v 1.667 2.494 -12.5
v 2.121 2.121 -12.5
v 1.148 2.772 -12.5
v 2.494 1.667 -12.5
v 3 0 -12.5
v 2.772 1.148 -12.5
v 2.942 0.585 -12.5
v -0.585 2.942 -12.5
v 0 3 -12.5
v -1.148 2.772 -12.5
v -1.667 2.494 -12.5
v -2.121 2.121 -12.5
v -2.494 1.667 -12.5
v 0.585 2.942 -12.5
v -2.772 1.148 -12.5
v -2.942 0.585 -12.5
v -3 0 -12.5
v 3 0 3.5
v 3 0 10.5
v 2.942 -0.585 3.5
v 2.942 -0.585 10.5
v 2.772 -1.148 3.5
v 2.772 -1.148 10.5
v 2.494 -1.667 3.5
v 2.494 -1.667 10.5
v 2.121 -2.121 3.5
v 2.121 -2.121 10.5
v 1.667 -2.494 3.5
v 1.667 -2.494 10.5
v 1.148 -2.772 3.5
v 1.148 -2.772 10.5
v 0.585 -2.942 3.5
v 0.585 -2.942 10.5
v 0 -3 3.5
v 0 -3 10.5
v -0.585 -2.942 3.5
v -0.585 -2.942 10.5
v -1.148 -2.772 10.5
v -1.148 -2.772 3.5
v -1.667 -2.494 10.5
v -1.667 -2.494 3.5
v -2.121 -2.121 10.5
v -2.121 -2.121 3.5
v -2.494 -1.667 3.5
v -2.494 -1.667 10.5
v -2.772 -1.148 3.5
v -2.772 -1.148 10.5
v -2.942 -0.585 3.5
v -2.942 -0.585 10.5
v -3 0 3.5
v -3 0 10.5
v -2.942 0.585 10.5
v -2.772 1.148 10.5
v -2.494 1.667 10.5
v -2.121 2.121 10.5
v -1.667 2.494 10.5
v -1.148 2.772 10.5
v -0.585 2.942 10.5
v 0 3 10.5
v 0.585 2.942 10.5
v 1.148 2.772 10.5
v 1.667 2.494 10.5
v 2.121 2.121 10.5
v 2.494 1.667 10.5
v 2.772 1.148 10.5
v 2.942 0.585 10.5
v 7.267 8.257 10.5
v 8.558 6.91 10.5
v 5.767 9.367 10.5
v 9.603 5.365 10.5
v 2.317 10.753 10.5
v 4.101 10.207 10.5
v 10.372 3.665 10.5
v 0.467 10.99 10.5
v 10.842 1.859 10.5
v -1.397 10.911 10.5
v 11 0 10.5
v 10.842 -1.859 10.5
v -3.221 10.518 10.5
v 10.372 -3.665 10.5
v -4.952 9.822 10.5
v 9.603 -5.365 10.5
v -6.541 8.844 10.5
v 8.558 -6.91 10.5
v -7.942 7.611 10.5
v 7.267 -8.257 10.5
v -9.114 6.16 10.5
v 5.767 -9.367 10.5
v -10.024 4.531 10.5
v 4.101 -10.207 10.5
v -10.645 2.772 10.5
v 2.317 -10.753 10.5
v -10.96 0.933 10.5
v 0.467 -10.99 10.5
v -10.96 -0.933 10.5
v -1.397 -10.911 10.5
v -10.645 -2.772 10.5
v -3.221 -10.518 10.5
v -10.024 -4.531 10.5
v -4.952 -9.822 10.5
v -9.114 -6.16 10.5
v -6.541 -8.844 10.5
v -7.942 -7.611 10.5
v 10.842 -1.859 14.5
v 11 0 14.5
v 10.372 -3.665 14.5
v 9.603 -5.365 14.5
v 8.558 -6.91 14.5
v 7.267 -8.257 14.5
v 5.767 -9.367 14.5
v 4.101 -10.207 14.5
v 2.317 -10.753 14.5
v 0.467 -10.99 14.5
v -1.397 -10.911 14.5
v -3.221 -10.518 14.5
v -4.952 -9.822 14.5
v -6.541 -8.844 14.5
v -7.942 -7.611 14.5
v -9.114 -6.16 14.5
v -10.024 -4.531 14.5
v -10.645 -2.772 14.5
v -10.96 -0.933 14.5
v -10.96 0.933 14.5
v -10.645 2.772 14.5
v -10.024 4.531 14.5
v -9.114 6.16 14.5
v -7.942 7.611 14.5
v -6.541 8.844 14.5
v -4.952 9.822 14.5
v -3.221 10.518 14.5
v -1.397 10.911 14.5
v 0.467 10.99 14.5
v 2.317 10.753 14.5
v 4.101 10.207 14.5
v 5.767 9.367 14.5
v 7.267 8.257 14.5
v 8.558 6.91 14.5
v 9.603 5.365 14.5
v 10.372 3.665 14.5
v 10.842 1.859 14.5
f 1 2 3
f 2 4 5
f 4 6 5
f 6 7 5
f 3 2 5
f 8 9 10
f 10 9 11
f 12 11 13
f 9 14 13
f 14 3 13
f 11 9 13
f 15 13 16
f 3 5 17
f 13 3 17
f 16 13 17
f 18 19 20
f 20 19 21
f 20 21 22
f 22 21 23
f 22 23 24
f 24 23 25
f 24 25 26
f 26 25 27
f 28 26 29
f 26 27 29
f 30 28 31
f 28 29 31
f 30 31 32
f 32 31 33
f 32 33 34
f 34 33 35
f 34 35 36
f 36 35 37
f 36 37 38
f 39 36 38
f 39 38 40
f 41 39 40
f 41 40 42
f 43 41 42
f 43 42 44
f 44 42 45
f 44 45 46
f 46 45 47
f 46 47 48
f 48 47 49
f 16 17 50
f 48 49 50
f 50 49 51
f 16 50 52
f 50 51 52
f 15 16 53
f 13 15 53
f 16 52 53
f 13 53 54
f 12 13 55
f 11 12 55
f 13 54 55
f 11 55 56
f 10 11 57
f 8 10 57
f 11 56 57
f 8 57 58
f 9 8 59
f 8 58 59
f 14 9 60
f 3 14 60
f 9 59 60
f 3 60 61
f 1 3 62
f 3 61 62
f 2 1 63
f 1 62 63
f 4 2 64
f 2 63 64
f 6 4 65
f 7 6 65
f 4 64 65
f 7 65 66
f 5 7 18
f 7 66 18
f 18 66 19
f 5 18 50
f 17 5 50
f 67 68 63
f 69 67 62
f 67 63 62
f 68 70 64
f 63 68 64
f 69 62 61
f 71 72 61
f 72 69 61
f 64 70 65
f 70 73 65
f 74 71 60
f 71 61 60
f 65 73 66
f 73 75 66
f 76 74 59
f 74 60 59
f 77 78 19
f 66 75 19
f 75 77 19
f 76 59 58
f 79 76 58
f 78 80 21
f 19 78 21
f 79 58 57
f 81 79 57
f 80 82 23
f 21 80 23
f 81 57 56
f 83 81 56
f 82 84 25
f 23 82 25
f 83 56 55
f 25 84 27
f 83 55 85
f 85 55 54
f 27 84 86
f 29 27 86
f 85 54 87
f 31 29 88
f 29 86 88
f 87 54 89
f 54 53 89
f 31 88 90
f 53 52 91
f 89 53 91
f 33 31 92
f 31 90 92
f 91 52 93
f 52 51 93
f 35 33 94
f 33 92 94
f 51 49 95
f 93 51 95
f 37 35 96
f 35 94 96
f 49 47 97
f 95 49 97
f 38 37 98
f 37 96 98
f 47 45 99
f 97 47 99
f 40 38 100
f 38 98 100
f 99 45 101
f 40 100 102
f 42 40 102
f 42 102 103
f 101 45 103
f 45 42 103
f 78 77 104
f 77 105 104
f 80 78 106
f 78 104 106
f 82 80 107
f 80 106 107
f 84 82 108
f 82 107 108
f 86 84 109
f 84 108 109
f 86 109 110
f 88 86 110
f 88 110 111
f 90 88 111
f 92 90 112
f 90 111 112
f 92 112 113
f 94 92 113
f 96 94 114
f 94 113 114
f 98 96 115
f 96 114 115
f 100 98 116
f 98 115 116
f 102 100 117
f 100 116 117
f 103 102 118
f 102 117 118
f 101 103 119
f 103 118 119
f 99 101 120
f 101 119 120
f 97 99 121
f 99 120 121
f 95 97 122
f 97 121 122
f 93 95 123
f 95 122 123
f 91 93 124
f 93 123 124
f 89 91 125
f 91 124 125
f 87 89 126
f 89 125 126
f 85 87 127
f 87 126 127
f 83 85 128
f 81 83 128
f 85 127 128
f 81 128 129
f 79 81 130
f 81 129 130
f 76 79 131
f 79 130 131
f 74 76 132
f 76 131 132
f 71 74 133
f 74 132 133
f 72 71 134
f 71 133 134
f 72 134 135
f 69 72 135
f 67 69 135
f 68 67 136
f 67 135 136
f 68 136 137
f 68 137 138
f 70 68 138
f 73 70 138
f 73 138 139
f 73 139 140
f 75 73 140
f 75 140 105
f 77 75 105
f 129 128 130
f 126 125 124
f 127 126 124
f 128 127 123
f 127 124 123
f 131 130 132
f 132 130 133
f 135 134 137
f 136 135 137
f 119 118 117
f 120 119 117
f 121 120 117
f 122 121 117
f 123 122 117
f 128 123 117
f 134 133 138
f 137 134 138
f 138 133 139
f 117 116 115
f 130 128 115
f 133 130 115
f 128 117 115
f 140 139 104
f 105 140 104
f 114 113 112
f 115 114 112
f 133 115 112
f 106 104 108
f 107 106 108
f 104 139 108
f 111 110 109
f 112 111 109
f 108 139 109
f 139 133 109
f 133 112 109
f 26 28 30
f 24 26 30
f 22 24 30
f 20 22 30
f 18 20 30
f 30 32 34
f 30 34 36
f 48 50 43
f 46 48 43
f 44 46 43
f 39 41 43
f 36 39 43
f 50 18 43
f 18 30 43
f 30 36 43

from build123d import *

# Parameters (mm, degrees)
F0_W     = 3
F0_H     = 7
F0_H_2   = 2
F0_H_3   = 16
F2_ANGLE = 180


# Not quite as in the source:
# - a feature names something its author has since deleted; it is built from what else it names


with BuildPart() as f1:
    # F0 (on Front) → F1 (revolve)
    with BuildSketch(Plane.XZ):
        Polygon((0, 14.5), (0, 12.5), (3, 12.5), (3, 10.5), (11, 10.5), (11, 14.5), align=None)
        with Locations((1.5, 7)):
            Rectangle(F0_W, F0_H)
        with Locations((1.5, 11.5)):
            Rectangle(F0_W, F0_H_2)
        with Locations((1.5, -4.5)):
            Rectangle(F0_W, F0_H_3)
    revolve(axis=Axis((0, 0, 1), (0, 0, -1)))

    # F0 (on Front) → F2 (revolve, cut)
    with BuildSketch(Plane.XZ):
        with Locations((-1.5, -4.5)):
            Rectangle(F0_W, F0_H_3)
    revolve(axis=Axis((0, 0, 1), (0, 0, 1)), revolution_arc=F2_ANGLE, mode=Mode.SUBTRACT)


solid = f1.part
